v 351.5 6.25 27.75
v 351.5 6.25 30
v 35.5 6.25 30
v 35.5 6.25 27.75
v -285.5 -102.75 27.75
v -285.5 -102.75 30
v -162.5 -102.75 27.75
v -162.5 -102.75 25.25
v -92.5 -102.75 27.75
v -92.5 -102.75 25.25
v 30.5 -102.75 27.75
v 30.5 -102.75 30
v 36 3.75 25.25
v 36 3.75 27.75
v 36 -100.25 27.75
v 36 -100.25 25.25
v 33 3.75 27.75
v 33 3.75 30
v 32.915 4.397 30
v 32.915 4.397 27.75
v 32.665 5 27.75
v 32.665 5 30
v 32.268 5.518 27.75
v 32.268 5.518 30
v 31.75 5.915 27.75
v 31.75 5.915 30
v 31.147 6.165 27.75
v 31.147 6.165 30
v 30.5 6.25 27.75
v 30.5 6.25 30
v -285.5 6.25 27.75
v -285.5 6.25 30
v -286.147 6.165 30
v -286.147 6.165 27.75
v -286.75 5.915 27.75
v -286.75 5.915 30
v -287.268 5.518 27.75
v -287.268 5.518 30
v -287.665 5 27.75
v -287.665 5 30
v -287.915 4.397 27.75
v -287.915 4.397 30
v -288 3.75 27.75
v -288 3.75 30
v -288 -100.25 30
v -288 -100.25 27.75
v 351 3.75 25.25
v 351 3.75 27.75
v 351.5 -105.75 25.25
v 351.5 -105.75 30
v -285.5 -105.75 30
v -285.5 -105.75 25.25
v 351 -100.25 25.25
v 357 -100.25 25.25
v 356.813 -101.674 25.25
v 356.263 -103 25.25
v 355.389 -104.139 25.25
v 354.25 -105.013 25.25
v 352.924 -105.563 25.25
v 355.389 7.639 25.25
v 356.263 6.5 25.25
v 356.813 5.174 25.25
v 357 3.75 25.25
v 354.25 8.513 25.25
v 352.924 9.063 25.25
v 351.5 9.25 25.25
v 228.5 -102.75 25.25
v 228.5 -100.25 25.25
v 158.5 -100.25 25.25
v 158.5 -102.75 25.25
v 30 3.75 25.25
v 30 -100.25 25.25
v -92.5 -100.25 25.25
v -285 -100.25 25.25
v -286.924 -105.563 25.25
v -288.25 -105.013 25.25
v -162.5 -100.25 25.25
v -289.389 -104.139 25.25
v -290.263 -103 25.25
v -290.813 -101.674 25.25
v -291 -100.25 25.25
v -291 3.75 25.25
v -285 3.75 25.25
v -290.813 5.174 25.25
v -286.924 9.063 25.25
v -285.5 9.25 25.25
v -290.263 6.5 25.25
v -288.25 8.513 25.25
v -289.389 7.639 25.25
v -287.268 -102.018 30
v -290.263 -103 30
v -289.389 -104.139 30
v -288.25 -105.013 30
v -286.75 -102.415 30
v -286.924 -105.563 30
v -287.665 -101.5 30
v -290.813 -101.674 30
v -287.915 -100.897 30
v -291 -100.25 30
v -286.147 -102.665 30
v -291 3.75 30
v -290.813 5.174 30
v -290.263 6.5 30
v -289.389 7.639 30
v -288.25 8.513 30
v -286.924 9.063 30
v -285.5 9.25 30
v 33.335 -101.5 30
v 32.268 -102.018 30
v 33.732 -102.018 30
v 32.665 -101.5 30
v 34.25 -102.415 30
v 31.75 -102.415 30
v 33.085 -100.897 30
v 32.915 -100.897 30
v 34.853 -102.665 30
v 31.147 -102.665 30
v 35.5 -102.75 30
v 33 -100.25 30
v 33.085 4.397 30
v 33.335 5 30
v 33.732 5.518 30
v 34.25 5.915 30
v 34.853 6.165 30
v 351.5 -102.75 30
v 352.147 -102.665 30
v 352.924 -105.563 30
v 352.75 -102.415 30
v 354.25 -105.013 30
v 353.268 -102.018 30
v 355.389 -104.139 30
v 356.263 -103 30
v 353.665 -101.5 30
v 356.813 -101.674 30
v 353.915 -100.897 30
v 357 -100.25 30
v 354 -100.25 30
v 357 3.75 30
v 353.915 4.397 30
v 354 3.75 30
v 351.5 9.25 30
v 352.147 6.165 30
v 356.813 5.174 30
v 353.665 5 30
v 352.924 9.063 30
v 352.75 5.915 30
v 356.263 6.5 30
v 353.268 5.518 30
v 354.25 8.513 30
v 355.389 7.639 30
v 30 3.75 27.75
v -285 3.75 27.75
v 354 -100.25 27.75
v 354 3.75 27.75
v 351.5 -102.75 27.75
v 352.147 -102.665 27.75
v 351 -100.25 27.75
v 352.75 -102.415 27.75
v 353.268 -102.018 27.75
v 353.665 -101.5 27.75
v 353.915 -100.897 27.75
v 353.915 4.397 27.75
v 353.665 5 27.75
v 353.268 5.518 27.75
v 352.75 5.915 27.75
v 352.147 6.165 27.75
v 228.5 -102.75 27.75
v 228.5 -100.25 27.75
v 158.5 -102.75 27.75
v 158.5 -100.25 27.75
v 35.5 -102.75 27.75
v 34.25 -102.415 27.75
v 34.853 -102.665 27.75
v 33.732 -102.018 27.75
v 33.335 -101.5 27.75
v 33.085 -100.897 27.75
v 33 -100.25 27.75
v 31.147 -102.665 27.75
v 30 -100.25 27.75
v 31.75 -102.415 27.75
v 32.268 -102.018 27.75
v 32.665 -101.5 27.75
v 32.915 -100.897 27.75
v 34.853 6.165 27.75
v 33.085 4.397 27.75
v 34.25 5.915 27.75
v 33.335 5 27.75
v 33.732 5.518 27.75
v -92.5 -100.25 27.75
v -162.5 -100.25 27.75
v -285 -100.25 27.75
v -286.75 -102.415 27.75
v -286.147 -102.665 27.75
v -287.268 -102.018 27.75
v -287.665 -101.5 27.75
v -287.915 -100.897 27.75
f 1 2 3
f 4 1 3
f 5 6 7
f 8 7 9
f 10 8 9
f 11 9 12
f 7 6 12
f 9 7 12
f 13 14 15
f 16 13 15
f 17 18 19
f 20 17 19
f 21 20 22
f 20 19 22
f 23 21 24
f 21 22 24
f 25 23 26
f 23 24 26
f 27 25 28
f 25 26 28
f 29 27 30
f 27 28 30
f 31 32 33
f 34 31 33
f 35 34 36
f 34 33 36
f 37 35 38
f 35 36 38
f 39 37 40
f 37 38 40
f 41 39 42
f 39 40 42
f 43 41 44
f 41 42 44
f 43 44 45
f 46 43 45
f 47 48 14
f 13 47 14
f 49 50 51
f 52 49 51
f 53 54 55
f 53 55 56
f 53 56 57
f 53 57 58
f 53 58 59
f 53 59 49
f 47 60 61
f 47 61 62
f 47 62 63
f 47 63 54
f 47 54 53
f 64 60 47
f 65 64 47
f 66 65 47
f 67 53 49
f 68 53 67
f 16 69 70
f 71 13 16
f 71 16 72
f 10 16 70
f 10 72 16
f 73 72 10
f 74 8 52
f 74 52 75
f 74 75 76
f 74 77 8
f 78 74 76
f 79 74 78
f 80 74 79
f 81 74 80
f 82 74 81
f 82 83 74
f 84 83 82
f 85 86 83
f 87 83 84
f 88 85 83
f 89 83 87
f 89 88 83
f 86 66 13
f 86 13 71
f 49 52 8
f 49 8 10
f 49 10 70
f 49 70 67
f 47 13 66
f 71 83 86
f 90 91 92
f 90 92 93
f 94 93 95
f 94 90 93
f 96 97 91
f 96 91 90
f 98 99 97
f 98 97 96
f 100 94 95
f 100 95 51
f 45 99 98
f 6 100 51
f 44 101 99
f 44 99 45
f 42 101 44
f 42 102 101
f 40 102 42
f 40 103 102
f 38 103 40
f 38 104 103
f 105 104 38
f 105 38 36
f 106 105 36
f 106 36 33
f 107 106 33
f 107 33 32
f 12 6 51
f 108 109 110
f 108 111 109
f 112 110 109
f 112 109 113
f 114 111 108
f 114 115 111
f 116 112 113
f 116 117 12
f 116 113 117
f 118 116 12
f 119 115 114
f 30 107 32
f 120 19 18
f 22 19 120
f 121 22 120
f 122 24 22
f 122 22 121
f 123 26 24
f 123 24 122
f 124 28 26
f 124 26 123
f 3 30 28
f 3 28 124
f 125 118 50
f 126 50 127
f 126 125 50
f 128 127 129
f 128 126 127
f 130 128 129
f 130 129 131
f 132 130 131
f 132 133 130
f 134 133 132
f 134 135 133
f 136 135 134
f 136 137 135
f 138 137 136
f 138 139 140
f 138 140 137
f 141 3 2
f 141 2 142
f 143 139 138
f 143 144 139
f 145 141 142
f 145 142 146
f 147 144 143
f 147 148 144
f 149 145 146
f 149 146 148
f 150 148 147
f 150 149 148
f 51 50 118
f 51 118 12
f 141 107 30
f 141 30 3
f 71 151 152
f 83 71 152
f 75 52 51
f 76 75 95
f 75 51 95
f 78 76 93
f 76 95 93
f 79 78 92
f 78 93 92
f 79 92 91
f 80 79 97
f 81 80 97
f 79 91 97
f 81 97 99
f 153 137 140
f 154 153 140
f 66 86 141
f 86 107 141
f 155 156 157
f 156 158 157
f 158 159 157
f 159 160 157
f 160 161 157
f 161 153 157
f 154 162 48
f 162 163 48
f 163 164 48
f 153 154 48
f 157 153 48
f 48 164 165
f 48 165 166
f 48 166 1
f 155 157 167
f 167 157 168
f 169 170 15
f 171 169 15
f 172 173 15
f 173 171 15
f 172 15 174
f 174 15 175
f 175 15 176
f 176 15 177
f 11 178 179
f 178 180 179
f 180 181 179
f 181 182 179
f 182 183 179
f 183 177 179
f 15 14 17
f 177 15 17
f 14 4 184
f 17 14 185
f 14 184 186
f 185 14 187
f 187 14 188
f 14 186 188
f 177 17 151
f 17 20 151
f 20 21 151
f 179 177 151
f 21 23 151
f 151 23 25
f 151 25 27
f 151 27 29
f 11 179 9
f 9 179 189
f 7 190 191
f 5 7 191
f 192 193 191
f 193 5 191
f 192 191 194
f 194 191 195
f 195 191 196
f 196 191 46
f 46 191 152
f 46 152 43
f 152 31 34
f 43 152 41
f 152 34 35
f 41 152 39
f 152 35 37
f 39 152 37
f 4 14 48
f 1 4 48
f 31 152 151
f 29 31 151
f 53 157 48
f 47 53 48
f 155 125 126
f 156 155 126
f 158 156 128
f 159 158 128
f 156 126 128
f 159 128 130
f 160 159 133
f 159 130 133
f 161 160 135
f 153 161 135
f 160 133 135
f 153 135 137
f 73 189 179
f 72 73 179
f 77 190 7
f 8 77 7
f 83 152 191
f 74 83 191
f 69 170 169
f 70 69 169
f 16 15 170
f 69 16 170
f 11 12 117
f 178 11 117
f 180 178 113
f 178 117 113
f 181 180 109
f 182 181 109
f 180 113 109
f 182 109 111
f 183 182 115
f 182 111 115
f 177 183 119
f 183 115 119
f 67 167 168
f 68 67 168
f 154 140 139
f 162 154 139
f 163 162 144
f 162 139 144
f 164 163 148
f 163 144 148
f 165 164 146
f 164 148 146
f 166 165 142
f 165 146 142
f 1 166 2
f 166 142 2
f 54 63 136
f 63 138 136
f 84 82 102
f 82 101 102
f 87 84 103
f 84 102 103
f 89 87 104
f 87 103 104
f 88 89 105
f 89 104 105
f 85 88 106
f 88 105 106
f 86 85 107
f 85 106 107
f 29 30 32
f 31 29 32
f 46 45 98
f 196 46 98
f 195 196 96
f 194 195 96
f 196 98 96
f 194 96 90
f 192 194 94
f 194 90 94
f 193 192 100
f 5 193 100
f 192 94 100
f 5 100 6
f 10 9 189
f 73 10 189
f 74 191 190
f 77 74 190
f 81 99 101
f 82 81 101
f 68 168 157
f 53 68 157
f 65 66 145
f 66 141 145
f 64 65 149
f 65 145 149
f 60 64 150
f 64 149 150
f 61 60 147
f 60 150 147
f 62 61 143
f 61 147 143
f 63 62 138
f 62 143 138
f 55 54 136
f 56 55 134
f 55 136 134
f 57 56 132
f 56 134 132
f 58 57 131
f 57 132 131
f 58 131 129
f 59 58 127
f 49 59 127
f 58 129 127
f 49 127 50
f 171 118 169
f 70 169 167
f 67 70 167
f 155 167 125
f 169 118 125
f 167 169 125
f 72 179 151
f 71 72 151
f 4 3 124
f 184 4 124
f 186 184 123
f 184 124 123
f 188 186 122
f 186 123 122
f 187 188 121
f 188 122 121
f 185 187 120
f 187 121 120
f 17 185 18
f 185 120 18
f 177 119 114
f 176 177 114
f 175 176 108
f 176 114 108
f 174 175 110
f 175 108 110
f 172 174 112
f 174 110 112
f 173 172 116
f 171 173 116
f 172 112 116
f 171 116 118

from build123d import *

# Parameters (mm, degrees)
BOSS_EXTRUDE1_DEPTH = 2.25
BOSS_EXTRUDE2_DEPTH = 2.5


with BuildPart() as part:
    # Sketch1 → Boss-Extrude1 (new body)
    with BuildSketch(Plane.XY.offset(30)):
        with BuildLine():
            Line((-291, 3.75), (-291, -100.25))
            ThreePointArc((-291, -100.25), (-289.389087297, -104.139087297), (-285.5, -105.75))
            Line((-285.5, -105.75), (30.5, -105.75))
            Line((30.5, -105.75), (35.5, -105.75))
            Line((35.5, -105.75), (351.5, -105.75))
            ThreePointArc((351.5, -105.75), (355.389087297, -104.139087297), (357, -100.25))
            Line((357, -100.25), (357, 3.75))
            ThreePointArc((357, 3.75), (355.389087297, 7.639087297), (351.5, 9.25))
            Line((351.5, 9.25), (35.5, 9.25))
            Line((35.5, 9.25), (30.5, 9.25))
            Line((30.5, 9.25), (-285.5, 9.25))
            ThreePointArc((-285.5, 9.25), (-289.389087297, 7.639087297), (-291, 3.75))
        make_face()
        with BuildLine():
            Line((30.5, 6.25), (-285.5, 6.25))
            ThreePointArc((-285.5, 6.25), (-287.267766953, 5.517766953), (-288, 3.75))
            Line((-288, 3.75), (-288, -100.25))
            ThreePointArc((-288, -100.25), (-287.267766953, -102.017766953), (-285.5, -102.75))
            Line((-285.5, -102.75), (30.5, -102.75))
            ThreePointArc((30.5, -102.75), (32.267766953, -102.017766953), (33, -100.25))
            ThreePointArc((33, -100.25), (33.732233047, -102.017766953), (35.5, -102.75))
            Line((35.5, -102.75), (351.5, -102.75))
            ThreePointArc((351.5, -102.75), (353.267766953, -102.017766953), (354, -100.25))
            Line((354, -100.25), (354, 3.75))
            ThreePointArc((354, 3.75), (353.267766953, 5.517766953), (351.5, 6.25))
            Line((351.5, 6.25), (35.5, 6.25))
            ThreePointArc((35.5, 6.25), (33.732233047, 5.517766953), (33, 3.75))
            ThreePointArc((33, 3.75), (32.267766953, 5.517766953), (30.5, 6.25))
        make_face(mode=Mode.SUBTRACT)
    extrude(amount=-BOSS_EXTRUDE1_DEPTH)

    # Sketch2 → Boss-Extrude2 (add)
    # profile 1 of 2: a face of its own
    with BuildSketch(Plane(origin=(0, 0, 27.75), x_dir=(-1, 0, 0), z_dir=(0, 0, -1))):
        with BuildLine():
            Line((291, -100.25), (291, 3.75))
            ThreePointArc((291, 3.75), (289.389087297, 7.639087297), (285.5, 9.25))
            Line((285.5, 9.25), (-351.5, 9.25))
            ThreePointArc((-351.5, 9.25), (-355.389087297, 7.639087297), (-357, 3.75))
            Line((-357, 3.75), (-357, -100.25))
            ThreePointArc((-357, -100.25), (-355.389087297, -104.139087297), (-351.5, -105.75))
            Line((-351.5, -105.75), (285.5, -105.75))
            ThreePointArc((285.5, -105.75), (289.389087297, -104.139087297), (291, -100.25))
        make_face()
        with BuildLine():
            ThreePointArc((288, -100.25), (287.267766953, -102.017766953), (285.5, -102.75))
            Line((285.5, -102.75), (-30.5, -102.75))
            ThreePointArc((-30.5, -102.75), (-32.267766953, -102.017766953), (-33, -100.25))
            ThreePointArc((-33, -100.25), (-33.732233047, -102.017766953), (-35.5, -102.75))
            Line((-35.5, -102.75), (-351.5, -102.75))
            ThreePointArc((-351.5, -102.75), (-353.267766953, -102.017766953), (-354, -100.25))
            Line((-354, -100.25), (-354, 3.75))
            ThreePointArc((-354, 3.75), (-353.267766953, 5.517766953), (-351.5, 6.25))
            Line((-351.5, 6.25), (-35.5, 6.25))
            ThreePointArc((-35.5, 6.25), (-33.732233047, 5.517766953), (-33, 3.75))
            ThreePointArc((-33, 3.75), (-32.267766953, 5.517766953), (-30.5, 6.25))
            Line((-30.5, 6.25), (285.5, 6.25))
            ThreePointArc((285.5, 6.25), (287.267766953, 5.517766953), (288, 3.75))
            Line((288, 3.75), (288, -100.25))
        make_face(mode=Mode.SUBTRACT)
    # profile 2 of 2: a face of its own
    with BuildSketch(Plane(origin=(0, 0, 27.75), x_dir=(-1, 0, 0), z_dir=(0, 0, -1))):
        with BuildLine():
            Line((-351, 3.75), (-36, 3.75))
            Line((-36, 3.75), (-36, -100.25))
            Line((-36, -100.25), (-158.5, -100.25))
            Line((-158.5, -100.25), (-158.5, -102.75))
            Line((-158.5, -102.75), (-35.5, -102.75))
            ThreePointArc((-35.5, -102.75), (-33.732233047, -102.017766953), (-33, -100.25))
            ThreePointArc((-33, -100.25), (-32.267766953, -102.017766953), (-30.5, -102.75))
            Line((-30.5, -102.75), (92.5, -102.75))
            Line((92.5, -102.75), (92.5, -100.25))
            Line((92.5, -100.25), (-30, -100.25))
            Line((-30, -100.25), (-30, 3.75))
            Line((-30, 3.75), (285, 3.75))
            Line((285, 3.75), (285, -100.25))
            Line((285, -100.25), (162.5, -100.25))
            Line((162.5, -100.25), (162.5, -102.75))
            Line((162.5, -102.75), (285.5, -102.75))
            ThreePointArc((285.5, -102.75), (287.267766953, -102.017766953), (288, -100.25))
            Line((288, -100.25), (288, 3.75))
            ThreePointArc((288, 3.75), (287.267766953, 5.517766953), (285.5, 6.25))
            Line((285.5, 6.25), (-30.5, 6.25))
            ThreePointArc((-30.5, 6.25), (-32.267766953, 5.517766953), (-33, 3.75))
            ThreePointArc((-33, 3.75), (-33.732233047, 5.517766953), (-35.5, 6.25))
            Line((-35.5, 6.25), (-351.5, 6.25))
            ThreePointArc((-351.5, 6.25), (-353.267766953, 5.517766953), (-354, 3.75))
            Line((-354, 3.75), (-354, -100.25))
            ThreePointArc((-354, -100.25), (-353.267766953, -102.017766953), (-351.5, -102.75))
            Line((-351.5, -102.75), (-228.5, -102.75))
            Line((-228.5, -102.75), (-228.5, -100.25))
            Line((-228.5, -100.25), (-351, -100.25))
            Line((-351, -100.25), (-351, 3.75))
        make_face()
    extrude(amount=BOSS_EXTRUDE2_DEPTH)


solid = part.part
